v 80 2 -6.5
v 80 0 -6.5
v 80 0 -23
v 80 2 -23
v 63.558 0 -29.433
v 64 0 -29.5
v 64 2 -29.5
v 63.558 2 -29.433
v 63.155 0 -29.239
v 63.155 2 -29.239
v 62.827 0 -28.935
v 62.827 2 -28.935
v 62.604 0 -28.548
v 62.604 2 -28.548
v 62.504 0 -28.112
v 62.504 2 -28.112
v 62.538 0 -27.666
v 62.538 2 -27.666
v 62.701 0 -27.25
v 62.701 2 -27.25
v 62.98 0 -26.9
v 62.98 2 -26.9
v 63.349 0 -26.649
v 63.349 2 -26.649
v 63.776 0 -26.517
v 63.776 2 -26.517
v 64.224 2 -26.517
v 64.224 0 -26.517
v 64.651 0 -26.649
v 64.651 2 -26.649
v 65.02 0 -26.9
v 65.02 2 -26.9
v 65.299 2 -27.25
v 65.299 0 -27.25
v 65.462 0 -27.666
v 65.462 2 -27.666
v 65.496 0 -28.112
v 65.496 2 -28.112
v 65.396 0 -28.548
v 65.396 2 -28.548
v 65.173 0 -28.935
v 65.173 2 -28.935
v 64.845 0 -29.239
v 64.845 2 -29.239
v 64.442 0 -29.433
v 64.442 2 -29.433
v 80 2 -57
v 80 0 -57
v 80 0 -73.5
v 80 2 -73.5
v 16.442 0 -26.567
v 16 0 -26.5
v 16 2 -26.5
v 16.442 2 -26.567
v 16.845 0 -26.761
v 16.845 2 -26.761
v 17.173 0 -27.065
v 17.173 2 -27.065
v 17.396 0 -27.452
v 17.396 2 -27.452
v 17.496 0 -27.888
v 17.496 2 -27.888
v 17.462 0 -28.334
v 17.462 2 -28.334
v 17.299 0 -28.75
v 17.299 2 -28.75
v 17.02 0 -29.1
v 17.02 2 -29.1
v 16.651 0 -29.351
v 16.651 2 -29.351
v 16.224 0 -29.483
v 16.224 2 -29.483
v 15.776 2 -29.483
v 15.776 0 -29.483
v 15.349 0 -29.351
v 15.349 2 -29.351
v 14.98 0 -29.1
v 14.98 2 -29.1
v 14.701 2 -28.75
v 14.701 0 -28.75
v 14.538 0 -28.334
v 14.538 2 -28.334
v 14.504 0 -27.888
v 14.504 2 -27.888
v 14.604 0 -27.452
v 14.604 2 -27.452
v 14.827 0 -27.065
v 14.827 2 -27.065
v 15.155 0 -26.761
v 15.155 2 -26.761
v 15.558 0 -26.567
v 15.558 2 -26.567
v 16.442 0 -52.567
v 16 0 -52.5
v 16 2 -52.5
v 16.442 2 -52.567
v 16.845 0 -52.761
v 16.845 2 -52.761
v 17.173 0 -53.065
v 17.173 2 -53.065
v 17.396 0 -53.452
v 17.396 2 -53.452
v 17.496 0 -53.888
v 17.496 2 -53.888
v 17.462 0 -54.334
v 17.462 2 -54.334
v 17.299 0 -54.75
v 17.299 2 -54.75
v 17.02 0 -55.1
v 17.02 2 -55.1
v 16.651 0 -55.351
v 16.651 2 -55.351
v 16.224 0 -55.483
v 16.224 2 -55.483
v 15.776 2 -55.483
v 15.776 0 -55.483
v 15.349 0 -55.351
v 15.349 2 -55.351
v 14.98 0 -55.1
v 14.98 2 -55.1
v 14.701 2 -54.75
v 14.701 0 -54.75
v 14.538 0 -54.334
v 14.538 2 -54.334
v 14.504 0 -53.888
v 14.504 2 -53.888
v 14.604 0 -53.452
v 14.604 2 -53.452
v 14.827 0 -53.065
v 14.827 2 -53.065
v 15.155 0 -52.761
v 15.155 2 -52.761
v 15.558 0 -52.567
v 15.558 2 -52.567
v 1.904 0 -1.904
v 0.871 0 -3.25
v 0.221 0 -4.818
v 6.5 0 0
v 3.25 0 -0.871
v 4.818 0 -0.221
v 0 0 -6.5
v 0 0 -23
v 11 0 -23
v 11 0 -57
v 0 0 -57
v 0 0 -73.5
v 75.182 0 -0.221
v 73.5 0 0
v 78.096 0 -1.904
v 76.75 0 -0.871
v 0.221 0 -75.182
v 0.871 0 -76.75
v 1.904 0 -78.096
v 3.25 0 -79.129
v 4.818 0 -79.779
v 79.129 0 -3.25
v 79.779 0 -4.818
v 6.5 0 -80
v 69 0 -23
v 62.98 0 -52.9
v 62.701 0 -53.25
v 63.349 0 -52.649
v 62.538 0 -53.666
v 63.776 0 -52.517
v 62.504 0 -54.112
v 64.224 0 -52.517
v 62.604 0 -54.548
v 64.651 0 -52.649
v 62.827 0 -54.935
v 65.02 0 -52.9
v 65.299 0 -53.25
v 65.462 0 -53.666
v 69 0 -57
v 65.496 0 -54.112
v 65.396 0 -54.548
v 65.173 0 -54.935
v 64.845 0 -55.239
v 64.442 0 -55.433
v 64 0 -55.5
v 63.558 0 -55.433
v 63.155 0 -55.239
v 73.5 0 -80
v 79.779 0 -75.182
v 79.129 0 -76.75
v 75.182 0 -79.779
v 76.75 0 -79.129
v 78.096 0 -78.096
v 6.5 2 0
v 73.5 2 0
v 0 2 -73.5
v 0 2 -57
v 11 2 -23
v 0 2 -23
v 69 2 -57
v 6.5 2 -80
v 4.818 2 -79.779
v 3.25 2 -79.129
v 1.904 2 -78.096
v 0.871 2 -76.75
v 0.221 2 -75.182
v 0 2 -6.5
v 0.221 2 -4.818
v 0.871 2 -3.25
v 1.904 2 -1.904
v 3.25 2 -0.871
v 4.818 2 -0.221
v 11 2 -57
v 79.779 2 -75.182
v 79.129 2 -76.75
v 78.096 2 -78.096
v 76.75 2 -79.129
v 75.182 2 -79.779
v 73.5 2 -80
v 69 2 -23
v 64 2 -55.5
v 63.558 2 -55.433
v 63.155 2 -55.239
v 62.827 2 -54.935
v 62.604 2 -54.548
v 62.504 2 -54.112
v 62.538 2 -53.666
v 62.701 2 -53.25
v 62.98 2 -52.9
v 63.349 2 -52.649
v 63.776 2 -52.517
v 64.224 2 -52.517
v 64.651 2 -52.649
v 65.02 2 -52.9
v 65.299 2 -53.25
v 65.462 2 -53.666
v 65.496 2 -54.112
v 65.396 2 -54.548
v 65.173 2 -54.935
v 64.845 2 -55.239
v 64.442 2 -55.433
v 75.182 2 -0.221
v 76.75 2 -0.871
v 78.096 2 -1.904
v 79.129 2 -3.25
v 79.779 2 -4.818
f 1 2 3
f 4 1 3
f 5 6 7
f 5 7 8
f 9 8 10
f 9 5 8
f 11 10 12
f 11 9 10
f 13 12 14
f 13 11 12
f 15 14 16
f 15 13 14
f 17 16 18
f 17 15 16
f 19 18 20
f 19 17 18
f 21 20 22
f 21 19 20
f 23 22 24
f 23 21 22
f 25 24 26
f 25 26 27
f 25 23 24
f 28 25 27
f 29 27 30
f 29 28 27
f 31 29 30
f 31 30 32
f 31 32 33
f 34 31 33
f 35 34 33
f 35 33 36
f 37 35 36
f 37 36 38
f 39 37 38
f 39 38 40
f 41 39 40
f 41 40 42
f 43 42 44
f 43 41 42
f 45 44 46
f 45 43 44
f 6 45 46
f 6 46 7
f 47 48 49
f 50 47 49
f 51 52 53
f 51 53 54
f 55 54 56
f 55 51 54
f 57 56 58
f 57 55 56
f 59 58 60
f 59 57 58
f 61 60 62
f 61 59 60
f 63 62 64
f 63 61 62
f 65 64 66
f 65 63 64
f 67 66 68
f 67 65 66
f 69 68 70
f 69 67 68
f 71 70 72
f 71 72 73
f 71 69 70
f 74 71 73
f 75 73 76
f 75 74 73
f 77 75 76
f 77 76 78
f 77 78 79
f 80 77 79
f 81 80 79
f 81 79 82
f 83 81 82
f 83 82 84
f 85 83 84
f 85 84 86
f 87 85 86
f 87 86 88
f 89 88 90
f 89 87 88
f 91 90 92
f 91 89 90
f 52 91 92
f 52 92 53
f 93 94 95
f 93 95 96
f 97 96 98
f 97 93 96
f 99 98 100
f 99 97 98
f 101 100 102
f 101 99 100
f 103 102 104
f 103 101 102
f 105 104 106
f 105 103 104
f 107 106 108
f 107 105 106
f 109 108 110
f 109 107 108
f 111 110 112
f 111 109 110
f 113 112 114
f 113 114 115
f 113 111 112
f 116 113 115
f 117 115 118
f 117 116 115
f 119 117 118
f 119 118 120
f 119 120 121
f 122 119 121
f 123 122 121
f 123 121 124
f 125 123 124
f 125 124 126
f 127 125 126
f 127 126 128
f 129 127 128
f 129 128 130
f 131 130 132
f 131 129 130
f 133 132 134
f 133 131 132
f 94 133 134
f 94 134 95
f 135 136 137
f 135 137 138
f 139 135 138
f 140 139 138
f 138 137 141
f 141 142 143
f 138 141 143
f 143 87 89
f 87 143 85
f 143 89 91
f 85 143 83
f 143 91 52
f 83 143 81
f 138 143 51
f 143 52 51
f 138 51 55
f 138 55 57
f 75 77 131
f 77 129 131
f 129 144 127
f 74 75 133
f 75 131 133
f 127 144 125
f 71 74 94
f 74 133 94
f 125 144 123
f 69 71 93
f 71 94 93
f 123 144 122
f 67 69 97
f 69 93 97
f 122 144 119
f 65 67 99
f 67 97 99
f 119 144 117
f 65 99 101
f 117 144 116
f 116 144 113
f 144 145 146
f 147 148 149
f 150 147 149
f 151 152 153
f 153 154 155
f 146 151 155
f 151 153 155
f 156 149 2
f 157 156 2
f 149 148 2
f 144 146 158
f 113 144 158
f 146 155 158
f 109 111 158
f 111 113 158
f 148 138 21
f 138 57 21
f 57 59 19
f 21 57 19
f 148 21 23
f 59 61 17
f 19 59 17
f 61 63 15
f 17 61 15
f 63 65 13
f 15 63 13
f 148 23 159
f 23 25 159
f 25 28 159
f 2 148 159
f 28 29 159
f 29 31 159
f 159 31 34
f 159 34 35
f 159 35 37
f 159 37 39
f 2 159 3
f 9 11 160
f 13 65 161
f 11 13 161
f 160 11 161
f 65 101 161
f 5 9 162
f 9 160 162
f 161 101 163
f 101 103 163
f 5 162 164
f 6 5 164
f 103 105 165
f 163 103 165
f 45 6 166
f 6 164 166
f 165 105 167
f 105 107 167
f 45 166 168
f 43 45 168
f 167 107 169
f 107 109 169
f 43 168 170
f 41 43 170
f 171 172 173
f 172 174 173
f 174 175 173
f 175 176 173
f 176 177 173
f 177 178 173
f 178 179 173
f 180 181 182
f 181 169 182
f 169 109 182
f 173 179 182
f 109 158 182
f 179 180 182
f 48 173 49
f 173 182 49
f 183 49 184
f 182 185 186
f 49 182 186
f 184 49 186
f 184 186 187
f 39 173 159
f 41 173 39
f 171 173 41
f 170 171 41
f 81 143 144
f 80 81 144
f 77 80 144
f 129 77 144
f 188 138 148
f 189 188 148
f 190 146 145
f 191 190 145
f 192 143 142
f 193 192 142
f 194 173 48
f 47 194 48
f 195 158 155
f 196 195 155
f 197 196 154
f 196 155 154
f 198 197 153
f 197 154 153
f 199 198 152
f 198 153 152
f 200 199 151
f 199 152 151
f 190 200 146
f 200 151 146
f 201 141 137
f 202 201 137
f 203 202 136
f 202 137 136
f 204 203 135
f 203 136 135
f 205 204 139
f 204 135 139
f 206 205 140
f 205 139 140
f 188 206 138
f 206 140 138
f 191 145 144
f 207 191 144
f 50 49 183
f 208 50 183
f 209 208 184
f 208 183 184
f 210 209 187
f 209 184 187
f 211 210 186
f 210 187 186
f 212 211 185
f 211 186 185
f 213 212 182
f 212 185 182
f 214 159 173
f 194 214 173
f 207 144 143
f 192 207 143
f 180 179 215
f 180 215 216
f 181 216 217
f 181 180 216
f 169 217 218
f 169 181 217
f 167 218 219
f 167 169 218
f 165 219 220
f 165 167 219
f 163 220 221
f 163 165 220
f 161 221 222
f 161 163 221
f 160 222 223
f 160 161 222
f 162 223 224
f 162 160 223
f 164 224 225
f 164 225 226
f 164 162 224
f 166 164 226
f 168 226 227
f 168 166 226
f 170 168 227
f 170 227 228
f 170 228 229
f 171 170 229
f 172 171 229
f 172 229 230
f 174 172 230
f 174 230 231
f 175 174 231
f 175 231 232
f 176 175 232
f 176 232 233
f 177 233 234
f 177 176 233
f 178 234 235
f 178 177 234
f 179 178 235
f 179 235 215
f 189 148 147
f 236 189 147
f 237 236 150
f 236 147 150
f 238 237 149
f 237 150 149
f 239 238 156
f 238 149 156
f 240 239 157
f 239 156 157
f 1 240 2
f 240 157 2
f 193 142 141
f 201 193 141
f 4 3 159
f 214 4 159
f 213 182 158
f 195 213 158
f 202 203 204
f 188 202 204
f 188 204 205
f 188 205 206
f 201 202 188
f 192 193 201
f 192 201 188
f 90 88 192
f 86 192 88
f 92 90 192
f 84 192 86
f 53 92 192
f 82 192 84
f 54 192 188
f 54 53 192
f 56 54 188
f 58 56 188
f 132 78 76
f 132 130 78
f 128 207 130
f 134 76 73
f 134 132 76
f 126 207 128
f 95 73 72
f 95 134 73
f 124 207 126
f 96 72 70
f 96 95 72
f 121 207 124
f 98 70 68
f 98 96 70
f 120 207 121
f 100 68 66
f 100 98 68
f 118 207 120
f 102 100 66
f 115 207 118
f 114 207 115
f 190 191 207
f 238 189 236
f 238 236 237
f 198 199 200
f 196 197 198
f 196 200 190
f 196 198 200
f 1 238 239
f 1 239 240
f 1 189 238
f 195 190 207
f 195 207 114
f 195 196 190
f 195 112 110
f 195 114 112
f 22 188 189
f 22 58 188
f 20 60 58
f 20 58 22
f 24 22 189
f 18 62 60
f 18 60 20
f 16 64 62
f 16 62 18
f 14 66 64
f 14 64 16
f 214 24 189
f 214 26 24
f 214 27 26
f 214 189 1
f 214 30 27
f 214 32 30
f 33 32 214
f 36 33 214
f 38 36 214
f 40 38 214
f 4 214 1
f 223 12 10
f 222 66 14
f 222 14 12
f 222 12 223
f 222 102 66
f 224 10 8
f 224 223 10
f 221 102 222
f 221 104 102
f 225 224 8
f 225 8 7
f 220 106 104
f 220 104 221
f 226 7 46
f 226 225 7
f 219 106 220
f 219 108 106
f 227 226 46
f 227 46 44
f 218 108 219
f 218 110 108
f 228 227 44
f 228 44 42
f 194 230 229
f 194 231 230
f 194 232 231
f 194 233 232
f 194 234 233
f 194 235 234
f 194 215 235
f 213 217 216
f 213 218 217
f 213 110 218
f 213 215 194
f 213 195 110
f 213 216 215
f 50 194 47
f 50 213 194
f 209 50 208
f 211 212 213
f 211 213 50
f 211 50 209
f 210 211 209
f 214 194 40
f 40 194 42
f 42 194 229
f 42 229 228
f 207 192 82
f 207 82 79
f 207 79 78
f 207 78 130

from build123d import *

# Parameters (mm, degrees)
SKETCH1_R           = 1.5
BOSS_EXTRUDE1_DEPTH = 2


with BuildPart() as part:
    # Sketch1 → Boss-Extrude1 (new body)
    with BuildSketch(Plane(origin=(0, 0, 0), x_dir=(1, 0, 0), z_dir=(0, 1, 0))):
        with BuildLine():
            Line((6.5, 0), (73.5, 0))
            ThreePointArc((73.5, 0), (78.096194078, 1.903805922), (80, 6.5))
            Line((80, 6.5), (80, 23))
            Line((80, 23), (69, 23))
            Line((69, 23), (69, 57))
            Line((69, 57), (80, 57))
            Line((80, 57), (80, 73.5))
            ThreePointArc((80, 73.5), (78.096194078, 78.096194078), (73.5, 80))
            Line((73.5, 80), (6.5, 80))
            ThreePointArc((6.5, 80), (1.903805922, 78.096194078), (0, 73.5))
            Line((0, 73.5), (0, 57))
            Line((0, 57), (11, 57))
            Line((11, 57), (11, 23))
            Line((11, 23), (0, 23))
            Line((0, 23), (0, 6.5))
            ThreePointArc((0, 6.5), (1.903805922, 1.903805922), (6.5, 0))
        make_face()
        with Locations(Location((16, 54, 0), (0, 0, 270))):
            Circle(SKETCH1_R, mode=Mode.SUBTRACT)
        with Locations(Location((16, 28, 0), (0, 0, 270))):
            Circle(SKETCH1_R, mode=Mode.SUBTRACT)
        with Locations(Location((64, 28, 0), (0, 0, 90))):
            Circle(SKETCH1_R, mode=Mode.SUBTRACT)
        with Locations(Location((64, 54, 0), (0, 0, 90))):
            Circle(SKETCH1_R, mode=Mode.SUBTRACT)
    extrude(amount=BOSS_EXTRUDE1_DEPTH)


solid = part.part
